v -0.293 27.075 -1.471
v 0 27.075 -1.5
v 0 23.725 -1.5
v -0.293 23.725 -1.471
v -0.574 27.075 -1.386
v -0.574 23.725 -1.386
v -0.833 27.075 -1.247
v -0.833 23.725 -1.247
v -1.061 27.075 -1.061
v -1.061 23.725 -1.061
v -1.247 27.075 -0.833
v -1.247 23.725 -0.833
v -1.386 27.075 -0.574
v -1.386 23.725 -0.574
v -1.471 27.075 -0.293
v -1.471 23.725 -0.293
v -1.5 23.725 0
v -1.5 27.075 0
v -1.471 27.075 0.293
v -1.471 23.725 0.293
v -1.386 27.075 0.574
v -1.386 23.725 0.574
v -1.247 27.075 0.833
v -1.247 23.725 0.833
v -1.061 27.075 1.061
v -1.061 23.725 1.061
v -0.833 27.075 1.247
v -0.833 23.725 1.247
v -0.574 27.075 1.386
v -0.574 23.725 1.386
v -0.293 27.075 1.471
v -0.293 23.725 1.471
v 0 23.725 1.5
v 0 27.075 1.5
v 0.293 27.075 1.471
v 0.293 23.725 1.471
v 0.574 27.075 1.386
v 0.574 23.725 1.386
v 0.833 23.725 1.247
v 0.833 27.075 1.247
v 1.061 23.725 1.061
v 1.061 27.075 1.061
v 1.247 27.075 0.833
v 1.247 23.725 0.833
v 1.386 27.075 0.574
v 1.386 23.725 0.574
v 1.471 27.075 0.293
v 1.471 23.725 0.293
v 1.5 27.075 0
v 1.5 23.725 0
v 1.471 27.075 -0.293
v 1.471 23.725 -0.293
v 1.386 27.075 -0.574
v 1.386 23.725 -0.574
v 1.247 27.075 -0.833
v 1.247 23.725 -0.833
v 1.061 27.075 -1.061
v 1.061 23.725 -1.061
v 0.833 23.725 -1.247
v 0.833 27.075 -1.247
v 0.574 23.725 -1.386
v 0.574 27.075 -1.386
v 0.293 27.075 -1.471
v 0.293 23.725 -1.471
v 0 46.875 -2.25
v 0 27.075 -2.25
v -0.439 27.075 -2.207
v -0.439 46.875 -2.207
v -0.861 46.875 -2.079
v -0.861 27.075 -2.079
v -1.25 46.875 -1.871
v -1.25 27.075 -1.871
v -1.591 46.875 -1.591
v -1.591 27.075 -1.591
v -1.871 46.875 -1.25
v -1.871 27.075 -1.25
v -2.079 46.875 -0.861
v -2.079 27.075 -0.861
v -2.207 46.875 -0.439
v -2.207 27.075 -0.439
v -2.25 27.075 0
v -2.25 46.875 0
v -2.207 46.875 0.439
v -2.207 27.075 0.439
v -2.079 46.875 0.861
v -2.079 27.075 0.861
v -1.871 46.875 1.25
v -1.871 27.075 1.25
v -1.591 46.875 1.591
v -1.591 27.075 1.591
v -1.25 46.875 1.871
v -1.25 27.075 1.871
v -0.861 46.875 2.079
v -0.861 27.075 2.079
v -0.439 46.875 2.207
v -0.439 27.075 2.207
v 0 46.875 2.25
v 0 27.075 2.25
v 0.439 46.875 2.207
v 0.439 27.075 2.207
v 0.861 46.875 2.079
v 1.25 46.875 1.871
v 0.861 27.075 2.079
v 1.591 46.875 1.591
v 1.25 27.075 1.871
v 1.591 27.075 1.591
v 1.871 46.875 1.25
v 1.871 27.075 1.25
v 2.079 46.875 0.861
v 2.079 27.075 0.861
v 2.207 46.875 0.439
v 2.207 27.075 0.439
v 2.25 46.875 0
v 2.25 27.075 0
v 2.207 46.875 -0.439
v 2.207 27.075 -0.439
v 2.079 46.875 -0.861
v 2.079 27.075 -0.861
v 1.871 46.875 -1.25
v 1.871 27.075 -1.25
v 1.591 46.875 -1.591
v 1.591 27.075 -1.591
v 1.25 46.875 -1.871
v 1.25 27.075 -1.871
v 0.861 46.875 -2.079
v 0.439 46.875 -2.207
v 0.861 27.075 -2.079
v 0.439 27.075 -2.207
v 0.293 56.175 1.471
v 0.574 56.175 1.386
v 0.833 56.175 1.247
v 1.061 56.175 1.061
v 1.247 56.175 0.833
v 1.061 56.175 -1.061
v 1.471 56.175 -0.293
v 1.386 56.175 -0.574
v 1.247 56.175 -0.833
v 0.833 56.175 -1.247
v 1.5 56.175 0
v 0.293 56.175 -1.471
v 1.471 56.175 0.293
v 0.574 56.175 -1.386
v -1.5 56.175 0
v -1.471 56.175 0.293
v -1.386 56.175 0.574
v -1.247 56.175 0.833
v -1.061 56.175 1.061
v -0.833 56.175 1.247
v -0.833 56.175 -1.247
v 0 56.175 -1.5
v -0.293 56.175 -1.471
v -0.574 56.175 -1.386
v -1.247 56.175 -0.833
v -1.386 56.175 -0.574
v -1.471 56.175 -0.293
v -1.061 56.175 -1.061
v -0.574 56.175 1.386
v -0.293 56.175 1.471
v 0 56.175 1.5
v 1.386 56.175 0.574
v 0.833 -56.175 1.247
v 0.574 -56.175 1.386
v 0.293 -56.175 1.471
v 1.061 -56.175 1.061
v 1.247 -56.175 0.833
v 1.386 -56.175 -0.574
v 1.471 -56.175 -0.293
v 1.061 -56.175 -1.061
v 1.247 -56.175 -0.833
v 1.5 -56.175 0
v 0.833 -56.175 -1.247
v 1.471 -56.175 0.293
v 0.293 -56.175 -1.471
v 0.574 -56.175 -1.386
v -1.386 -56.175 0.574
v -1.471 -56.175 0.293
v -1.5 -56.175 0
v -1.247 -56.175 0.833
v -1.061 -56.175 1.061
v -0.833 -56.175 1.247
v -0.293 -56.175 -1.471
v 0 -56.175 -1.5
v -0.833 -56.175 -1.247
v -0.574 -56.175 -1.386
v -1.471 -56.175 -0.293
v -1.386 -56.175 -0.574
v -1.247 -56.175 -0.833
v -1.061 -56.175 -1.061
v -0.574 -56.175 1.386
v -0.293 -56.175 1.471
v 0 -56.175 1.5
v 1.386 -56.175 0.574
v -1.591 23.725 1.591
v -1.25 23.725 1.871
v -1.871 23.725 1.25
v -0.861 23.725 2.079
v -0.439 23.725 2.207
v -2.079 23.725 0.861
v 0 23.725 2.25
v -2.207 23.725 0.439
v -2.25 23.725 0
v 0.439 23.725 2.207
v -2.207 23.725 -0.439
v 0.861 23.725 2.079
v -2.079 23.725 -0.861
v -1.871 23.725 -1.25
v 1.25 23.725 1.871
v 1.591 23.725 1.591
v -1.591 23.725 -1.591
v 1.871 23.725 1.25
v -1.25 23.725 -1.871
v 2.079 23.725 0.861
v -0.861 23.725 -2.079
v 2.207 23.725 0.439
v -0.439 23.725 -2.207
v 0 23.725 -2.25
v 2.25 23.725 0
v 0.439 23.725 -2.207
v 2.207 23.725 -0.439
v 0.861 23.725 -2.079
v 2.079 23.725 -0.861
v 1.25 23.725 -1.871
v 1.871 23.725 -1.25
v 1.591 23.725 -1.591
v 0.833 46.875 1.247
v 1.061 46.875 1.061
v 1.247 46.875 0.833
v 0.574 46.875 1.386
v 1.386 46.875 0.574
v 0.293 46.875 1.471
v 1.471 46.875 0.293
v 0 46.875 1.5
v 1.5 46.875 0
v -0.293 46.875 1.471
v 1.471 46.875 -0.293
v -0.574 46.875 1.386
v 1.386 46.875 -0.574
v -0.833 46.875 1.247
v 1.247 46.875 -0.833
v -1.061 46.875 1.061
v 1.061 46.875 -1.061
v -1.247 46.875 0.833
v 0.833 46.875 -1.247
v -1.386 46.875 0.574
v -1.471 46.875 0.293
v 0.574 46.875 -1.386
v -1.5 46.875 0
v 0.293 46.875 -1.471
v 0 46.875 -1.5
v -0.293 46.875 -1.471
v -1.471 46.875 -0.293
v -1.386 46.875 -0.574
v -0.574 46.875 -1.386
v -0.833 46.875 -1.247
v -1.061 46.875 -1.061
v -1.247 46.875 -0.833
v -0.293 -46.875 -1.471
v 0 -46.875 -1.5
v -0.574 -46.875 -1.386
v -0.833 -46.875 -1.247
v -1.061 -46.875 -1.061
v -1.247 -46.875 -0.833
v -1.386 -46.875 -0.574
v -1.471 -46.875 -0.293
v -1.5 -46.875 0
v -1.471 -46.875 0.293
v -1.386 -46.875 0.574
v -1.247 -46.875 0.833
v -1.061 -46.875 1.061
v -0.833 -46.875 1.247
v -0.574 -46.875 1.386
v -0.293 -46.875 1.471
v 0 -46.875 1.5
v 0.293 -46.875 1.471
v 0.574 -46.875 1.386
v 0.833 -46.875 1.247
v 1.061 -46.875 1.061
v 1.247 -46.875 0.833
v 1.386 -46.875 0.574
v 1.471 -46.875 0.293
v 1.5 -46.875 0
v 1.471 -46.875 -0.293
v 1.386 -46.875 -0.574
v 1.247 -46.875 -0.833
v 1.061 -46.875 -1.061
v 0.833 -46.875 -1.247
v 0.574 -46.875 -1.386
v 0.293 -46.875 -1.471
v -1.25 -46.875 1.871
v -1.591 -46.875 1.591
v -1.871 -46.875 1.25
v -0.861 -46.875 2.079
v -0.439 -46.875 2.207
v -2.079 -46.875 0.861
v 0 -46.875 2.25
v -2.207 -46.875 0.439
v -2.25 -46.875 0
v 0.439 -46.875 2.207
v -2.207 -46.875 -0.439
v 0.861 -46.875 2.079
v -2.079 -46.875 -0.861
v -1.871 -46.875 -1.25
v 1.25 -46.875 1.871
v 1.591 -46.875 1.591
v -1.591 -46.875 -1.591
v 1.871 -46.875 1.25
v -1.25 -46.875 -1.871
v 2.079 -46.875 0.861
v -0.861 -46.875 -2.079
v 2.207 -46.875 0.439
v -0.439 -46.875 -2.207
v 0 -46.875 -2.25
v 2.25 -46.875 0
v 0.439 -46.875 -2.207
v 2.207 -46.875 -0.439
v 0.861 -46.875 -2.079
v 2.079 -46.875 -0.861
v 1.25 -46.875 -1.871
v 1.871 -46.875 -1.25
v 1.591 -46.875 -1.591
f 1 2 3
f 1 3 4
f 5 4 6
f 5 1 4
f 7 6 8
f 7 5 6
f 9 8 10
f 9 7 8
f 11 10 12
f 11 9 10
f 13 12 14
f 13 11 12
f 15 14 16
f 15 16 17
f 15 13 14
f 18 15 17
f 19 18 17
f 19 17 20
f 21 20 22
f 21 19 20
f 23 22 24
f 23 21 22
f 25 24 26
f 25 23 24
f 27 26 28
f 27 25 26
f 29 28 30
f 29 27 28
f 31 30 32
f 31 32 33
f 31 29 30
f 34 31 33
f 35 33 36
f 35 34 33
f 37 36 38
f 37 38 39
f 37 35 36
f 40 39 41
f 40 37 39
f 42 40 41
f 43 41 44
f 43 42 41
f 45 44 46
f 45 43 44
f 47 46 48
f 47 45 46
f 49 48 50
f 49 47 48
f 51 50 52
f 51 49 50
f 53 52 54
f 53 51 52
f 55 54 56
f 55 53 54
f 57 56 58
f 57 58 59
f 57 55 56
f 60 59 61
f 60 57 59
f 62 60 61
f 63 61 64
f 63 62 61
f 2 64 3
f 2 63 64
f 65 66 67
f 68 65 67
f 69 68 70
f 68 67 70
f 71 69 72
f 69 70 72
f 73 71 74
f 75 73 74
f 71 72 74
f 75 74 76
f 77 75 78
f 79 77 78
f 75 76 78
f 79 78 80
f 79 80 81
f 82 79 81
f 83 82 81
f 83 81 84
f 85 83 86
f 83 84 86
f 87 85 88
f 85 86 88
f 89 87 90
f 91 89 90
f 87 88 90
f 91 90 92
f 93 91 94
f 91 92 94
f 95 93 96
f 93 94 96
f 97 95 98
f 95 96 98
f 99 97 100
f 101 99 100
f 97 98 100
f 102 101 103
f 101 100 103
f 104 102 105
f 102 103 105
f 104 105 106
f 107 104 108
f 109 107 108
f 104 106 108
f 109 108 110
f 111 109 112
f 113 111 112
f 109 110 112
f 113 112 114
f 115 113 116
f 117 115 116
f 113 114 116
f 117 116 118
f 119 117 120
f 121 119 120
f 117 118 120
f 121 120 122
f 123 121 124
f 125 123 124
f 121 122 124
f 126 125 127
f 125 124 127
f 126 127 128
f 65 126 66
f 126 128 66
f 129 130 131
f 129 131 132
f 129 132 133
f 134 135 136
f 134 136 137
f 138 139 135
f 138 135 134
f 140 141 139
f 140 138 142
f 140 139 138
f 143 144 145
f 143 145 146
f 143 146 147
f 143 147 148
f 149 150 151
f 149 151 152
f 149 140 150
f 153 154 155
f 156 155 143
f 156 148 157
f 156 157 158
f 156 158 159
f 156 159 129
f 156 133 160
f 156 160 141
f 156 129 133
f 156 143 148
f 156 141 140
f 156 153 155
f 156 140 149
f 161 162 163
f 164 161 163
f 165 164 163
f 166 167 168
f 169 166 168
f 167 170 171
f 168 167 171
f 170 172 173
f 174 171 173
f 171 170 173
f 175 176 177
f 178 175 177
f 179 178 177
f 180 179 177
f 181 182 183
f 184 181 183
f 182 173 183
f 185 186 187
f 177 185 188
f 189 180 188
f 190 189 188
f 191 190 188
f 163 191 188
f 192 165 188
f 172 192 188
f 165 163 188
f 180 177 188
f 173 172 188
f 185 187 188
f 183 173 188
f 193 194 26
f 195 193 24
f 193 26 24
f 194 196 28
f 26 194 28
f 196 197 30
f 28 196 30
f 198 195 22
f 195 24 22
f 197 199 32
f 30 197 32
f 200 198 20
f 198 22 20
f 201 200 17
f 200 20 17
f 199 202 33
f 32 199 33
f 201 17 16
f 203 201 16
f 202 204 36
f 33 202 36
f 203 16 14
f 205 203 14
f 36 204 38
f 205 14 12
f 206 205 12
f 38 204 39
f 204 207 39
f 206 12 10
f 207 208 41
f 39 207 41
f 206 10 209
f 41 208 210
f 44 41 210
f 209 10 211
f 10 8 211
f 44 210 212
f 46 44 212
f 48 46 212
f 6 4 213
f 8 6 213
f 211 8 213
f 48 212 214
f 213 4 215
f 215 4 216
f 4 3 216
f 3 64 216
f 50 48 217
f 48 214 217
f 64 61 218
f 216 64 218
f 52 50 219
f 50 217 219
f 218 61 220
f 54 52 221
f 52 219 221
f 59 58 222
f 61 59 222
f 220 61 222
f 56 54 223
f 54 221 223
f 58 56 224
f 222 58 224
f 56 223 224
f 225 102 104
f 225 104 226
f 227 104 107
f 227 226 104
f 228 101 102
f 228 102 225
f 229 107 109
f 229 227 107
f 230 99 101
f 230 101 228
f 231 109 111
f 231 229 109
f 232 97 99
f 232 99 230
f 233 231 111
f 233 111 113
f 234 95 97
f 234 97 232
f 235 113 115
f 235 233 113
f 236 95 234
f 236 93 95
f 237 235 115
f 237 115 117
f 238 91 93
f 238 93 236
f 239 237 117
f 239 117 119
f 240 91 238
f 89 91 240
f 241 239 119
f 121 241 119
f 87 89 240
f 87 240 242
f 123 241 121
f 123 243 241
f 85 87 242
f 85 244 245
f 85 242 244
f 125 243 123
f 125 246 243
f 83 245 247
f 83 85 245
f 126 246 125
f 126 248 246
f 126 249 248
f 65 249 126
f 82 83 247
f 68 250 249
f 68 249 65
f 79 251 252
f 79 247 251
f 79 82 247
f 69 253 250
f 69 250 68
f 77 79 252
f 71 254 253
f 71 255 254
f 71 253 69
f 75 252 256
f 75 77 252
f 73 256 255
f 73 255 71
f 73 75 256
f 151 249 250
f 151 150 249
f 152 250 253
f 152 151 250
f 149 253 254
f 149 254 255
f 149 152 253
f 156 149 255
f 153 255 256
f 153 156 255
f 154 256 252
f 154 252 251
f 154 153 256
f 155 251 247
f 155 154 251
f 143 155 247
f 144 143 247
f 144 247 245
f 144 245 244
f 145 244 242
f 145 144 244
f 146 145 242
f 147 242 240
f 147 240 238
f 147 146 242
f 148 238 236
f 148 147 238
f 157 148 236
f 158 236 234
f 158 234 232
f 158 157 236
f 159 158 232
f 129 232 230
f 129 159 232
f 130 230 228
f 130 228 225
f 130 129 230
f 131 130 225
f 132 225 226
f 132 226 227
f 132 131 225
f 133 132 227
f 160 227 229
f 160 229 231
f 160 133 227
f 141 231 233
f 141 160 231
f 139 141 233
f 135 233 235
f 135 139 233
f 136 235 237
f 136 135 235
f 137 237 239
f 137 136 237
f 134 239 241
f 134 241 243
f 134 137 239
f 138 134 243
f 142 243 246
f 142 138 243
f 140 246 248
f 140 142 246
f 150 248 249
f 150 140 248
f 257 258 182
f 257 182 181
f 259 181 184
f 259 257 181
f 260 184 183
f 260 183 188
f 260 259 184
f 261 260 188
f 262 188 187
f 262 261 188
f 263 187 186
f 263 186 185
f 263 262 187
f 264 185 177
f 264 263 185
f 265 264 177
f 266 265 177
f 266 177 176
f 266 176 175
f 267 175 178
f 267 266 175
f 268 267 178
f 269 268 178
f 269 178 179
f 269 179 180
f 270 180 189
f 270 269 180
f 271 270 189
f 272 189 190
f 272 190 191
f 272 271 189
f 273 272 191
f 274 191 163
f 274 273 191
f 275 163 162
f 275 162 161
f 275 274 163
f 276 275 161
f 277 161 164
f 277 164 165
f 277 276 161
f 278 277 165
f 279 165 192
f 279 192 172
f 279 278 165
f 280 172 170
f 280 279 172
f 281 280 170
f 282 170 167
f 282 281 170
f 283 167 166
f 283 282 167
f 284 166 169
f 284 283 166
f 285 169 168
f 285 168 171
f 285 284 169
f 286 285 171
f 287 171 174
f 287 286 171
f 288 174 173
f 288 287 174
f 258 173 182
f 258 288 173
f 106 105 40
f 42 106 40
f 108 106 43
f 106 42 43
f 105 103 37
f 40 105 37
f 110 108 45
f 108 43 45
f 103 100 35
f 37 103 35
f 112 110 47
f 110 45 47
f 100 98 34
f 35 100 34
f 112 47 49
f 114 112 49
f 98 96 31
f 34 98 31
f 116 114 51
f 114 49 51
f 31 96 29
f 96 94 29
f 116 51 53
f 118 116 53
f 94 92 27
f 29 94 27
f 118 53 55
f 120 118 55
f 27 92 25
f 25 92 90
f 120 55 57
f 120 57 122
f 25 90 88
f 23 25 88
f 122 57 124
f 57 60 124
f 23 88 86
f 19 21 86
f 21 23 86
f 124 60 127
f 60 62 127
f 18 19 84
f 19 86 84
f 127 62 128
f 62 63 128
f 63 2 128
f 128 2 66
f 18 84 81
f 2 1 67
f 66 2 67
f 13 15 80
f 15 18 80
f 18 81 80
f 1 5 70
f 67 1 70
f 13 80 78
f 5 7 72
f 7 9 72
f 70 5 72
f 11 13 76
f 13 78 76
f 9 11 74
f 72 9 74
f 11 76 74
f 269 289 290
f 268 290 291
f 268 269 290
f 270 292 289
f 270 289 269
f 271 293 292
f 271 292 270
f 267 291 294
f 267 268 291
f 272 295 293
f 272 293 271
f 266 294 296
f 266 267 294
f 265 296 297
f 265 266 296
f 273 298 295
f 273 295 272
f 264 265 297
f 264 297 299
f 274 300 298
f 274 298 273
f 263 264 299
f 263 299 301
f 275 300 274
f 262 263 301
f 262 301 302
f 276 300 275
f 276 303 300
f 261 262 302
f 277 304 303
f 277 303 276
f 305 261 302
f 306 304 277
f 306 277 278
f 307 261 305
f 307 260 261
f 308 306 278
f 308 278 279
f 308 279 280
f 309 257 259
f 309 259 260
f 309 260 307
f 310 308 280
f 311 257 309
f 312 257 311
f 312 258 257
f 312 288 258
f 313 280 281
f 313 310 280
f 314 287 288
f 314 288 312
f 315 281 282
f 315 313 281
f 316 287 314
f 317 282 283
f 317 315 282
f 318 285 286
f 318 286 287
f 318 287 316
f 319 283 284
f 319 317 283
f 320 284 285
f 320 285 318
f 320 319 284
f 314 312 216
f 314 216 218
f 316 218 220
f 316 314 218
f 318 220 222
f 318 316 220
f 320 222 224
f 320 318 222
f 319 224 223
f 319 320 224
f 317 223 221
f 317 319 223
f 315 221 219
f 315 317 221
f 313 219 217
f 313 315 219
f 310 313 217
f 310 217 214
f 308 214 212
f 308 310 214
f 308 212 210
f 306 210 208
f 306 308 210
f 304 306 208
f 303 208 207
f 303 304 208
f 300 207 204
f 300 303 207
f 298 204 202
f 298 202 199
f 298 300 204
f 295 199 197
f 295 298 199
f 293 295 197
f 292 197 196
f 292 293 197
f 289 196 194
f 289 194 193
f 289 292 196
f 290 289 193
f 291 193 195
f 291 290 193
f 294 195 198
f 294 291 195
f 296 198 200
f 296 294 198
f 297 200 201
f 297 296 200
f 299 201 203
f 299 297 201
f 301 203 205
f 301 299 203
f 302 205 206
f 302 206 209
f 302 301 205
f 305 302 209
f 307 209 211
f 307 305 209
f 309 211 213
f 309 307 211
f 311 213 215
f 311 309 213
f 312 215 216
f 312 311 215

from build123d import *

# Parameters (mm, degrees)
SKETCH_1_R      = 1.5
EXTRUDE_1_DEPTH = 56.175
EXTRUDE_START   = -9.3
SKETCH_2_R      = 2.25
EXTRUDE_2_DEPTH = 70.6
EXTRUDE_START_2 = -29.1
SKETCH_3_R      = 2.25
EXTRUDE_3_DEPTH = 19.8


with BuildPart() as part:
    # 草图1 → 凸台-拉伸1 (new, symmetric)
    with BuildSketch(Plane(origin=(0, 0, 0), x_dir=(1, 0, 0), z_dir=(0, 1, 0))):
        with Locations(Location((0, 0, 0), (0, 0, 90))):
            Circle(SKETCH_1_R)
    extrude(amount=EXTRUDE_1_DEPTH, both=True)

    # 草图2 → 凸台-拉伸2 (add)
    with BuildSketch(Plane.XZ.offset(56.175).offset(EXTRUDE_START)):
        with Locations(Location((0, 0, 0), (0, 0, 270))):
            Circle(SKETCH_2_R)
    extrude(amount=-EXTRUDE_2_DEPTH)

    # 草图3 → 凸台-拉伸3 (add)
    with BuildSketch(Plane(origin=(0, 56.175, 0), x_dir=(1, 0, 0), z_dir=(0, 1, 0)).offset(EXTRUDE_START_2)):
        with Locations(Location((0, 0, 0), (0, 0, 90))):
            Circle(SKETCH_3_R)
    extrude(amount=EXTRUDE_3_DEPTH)


solid = part.part
